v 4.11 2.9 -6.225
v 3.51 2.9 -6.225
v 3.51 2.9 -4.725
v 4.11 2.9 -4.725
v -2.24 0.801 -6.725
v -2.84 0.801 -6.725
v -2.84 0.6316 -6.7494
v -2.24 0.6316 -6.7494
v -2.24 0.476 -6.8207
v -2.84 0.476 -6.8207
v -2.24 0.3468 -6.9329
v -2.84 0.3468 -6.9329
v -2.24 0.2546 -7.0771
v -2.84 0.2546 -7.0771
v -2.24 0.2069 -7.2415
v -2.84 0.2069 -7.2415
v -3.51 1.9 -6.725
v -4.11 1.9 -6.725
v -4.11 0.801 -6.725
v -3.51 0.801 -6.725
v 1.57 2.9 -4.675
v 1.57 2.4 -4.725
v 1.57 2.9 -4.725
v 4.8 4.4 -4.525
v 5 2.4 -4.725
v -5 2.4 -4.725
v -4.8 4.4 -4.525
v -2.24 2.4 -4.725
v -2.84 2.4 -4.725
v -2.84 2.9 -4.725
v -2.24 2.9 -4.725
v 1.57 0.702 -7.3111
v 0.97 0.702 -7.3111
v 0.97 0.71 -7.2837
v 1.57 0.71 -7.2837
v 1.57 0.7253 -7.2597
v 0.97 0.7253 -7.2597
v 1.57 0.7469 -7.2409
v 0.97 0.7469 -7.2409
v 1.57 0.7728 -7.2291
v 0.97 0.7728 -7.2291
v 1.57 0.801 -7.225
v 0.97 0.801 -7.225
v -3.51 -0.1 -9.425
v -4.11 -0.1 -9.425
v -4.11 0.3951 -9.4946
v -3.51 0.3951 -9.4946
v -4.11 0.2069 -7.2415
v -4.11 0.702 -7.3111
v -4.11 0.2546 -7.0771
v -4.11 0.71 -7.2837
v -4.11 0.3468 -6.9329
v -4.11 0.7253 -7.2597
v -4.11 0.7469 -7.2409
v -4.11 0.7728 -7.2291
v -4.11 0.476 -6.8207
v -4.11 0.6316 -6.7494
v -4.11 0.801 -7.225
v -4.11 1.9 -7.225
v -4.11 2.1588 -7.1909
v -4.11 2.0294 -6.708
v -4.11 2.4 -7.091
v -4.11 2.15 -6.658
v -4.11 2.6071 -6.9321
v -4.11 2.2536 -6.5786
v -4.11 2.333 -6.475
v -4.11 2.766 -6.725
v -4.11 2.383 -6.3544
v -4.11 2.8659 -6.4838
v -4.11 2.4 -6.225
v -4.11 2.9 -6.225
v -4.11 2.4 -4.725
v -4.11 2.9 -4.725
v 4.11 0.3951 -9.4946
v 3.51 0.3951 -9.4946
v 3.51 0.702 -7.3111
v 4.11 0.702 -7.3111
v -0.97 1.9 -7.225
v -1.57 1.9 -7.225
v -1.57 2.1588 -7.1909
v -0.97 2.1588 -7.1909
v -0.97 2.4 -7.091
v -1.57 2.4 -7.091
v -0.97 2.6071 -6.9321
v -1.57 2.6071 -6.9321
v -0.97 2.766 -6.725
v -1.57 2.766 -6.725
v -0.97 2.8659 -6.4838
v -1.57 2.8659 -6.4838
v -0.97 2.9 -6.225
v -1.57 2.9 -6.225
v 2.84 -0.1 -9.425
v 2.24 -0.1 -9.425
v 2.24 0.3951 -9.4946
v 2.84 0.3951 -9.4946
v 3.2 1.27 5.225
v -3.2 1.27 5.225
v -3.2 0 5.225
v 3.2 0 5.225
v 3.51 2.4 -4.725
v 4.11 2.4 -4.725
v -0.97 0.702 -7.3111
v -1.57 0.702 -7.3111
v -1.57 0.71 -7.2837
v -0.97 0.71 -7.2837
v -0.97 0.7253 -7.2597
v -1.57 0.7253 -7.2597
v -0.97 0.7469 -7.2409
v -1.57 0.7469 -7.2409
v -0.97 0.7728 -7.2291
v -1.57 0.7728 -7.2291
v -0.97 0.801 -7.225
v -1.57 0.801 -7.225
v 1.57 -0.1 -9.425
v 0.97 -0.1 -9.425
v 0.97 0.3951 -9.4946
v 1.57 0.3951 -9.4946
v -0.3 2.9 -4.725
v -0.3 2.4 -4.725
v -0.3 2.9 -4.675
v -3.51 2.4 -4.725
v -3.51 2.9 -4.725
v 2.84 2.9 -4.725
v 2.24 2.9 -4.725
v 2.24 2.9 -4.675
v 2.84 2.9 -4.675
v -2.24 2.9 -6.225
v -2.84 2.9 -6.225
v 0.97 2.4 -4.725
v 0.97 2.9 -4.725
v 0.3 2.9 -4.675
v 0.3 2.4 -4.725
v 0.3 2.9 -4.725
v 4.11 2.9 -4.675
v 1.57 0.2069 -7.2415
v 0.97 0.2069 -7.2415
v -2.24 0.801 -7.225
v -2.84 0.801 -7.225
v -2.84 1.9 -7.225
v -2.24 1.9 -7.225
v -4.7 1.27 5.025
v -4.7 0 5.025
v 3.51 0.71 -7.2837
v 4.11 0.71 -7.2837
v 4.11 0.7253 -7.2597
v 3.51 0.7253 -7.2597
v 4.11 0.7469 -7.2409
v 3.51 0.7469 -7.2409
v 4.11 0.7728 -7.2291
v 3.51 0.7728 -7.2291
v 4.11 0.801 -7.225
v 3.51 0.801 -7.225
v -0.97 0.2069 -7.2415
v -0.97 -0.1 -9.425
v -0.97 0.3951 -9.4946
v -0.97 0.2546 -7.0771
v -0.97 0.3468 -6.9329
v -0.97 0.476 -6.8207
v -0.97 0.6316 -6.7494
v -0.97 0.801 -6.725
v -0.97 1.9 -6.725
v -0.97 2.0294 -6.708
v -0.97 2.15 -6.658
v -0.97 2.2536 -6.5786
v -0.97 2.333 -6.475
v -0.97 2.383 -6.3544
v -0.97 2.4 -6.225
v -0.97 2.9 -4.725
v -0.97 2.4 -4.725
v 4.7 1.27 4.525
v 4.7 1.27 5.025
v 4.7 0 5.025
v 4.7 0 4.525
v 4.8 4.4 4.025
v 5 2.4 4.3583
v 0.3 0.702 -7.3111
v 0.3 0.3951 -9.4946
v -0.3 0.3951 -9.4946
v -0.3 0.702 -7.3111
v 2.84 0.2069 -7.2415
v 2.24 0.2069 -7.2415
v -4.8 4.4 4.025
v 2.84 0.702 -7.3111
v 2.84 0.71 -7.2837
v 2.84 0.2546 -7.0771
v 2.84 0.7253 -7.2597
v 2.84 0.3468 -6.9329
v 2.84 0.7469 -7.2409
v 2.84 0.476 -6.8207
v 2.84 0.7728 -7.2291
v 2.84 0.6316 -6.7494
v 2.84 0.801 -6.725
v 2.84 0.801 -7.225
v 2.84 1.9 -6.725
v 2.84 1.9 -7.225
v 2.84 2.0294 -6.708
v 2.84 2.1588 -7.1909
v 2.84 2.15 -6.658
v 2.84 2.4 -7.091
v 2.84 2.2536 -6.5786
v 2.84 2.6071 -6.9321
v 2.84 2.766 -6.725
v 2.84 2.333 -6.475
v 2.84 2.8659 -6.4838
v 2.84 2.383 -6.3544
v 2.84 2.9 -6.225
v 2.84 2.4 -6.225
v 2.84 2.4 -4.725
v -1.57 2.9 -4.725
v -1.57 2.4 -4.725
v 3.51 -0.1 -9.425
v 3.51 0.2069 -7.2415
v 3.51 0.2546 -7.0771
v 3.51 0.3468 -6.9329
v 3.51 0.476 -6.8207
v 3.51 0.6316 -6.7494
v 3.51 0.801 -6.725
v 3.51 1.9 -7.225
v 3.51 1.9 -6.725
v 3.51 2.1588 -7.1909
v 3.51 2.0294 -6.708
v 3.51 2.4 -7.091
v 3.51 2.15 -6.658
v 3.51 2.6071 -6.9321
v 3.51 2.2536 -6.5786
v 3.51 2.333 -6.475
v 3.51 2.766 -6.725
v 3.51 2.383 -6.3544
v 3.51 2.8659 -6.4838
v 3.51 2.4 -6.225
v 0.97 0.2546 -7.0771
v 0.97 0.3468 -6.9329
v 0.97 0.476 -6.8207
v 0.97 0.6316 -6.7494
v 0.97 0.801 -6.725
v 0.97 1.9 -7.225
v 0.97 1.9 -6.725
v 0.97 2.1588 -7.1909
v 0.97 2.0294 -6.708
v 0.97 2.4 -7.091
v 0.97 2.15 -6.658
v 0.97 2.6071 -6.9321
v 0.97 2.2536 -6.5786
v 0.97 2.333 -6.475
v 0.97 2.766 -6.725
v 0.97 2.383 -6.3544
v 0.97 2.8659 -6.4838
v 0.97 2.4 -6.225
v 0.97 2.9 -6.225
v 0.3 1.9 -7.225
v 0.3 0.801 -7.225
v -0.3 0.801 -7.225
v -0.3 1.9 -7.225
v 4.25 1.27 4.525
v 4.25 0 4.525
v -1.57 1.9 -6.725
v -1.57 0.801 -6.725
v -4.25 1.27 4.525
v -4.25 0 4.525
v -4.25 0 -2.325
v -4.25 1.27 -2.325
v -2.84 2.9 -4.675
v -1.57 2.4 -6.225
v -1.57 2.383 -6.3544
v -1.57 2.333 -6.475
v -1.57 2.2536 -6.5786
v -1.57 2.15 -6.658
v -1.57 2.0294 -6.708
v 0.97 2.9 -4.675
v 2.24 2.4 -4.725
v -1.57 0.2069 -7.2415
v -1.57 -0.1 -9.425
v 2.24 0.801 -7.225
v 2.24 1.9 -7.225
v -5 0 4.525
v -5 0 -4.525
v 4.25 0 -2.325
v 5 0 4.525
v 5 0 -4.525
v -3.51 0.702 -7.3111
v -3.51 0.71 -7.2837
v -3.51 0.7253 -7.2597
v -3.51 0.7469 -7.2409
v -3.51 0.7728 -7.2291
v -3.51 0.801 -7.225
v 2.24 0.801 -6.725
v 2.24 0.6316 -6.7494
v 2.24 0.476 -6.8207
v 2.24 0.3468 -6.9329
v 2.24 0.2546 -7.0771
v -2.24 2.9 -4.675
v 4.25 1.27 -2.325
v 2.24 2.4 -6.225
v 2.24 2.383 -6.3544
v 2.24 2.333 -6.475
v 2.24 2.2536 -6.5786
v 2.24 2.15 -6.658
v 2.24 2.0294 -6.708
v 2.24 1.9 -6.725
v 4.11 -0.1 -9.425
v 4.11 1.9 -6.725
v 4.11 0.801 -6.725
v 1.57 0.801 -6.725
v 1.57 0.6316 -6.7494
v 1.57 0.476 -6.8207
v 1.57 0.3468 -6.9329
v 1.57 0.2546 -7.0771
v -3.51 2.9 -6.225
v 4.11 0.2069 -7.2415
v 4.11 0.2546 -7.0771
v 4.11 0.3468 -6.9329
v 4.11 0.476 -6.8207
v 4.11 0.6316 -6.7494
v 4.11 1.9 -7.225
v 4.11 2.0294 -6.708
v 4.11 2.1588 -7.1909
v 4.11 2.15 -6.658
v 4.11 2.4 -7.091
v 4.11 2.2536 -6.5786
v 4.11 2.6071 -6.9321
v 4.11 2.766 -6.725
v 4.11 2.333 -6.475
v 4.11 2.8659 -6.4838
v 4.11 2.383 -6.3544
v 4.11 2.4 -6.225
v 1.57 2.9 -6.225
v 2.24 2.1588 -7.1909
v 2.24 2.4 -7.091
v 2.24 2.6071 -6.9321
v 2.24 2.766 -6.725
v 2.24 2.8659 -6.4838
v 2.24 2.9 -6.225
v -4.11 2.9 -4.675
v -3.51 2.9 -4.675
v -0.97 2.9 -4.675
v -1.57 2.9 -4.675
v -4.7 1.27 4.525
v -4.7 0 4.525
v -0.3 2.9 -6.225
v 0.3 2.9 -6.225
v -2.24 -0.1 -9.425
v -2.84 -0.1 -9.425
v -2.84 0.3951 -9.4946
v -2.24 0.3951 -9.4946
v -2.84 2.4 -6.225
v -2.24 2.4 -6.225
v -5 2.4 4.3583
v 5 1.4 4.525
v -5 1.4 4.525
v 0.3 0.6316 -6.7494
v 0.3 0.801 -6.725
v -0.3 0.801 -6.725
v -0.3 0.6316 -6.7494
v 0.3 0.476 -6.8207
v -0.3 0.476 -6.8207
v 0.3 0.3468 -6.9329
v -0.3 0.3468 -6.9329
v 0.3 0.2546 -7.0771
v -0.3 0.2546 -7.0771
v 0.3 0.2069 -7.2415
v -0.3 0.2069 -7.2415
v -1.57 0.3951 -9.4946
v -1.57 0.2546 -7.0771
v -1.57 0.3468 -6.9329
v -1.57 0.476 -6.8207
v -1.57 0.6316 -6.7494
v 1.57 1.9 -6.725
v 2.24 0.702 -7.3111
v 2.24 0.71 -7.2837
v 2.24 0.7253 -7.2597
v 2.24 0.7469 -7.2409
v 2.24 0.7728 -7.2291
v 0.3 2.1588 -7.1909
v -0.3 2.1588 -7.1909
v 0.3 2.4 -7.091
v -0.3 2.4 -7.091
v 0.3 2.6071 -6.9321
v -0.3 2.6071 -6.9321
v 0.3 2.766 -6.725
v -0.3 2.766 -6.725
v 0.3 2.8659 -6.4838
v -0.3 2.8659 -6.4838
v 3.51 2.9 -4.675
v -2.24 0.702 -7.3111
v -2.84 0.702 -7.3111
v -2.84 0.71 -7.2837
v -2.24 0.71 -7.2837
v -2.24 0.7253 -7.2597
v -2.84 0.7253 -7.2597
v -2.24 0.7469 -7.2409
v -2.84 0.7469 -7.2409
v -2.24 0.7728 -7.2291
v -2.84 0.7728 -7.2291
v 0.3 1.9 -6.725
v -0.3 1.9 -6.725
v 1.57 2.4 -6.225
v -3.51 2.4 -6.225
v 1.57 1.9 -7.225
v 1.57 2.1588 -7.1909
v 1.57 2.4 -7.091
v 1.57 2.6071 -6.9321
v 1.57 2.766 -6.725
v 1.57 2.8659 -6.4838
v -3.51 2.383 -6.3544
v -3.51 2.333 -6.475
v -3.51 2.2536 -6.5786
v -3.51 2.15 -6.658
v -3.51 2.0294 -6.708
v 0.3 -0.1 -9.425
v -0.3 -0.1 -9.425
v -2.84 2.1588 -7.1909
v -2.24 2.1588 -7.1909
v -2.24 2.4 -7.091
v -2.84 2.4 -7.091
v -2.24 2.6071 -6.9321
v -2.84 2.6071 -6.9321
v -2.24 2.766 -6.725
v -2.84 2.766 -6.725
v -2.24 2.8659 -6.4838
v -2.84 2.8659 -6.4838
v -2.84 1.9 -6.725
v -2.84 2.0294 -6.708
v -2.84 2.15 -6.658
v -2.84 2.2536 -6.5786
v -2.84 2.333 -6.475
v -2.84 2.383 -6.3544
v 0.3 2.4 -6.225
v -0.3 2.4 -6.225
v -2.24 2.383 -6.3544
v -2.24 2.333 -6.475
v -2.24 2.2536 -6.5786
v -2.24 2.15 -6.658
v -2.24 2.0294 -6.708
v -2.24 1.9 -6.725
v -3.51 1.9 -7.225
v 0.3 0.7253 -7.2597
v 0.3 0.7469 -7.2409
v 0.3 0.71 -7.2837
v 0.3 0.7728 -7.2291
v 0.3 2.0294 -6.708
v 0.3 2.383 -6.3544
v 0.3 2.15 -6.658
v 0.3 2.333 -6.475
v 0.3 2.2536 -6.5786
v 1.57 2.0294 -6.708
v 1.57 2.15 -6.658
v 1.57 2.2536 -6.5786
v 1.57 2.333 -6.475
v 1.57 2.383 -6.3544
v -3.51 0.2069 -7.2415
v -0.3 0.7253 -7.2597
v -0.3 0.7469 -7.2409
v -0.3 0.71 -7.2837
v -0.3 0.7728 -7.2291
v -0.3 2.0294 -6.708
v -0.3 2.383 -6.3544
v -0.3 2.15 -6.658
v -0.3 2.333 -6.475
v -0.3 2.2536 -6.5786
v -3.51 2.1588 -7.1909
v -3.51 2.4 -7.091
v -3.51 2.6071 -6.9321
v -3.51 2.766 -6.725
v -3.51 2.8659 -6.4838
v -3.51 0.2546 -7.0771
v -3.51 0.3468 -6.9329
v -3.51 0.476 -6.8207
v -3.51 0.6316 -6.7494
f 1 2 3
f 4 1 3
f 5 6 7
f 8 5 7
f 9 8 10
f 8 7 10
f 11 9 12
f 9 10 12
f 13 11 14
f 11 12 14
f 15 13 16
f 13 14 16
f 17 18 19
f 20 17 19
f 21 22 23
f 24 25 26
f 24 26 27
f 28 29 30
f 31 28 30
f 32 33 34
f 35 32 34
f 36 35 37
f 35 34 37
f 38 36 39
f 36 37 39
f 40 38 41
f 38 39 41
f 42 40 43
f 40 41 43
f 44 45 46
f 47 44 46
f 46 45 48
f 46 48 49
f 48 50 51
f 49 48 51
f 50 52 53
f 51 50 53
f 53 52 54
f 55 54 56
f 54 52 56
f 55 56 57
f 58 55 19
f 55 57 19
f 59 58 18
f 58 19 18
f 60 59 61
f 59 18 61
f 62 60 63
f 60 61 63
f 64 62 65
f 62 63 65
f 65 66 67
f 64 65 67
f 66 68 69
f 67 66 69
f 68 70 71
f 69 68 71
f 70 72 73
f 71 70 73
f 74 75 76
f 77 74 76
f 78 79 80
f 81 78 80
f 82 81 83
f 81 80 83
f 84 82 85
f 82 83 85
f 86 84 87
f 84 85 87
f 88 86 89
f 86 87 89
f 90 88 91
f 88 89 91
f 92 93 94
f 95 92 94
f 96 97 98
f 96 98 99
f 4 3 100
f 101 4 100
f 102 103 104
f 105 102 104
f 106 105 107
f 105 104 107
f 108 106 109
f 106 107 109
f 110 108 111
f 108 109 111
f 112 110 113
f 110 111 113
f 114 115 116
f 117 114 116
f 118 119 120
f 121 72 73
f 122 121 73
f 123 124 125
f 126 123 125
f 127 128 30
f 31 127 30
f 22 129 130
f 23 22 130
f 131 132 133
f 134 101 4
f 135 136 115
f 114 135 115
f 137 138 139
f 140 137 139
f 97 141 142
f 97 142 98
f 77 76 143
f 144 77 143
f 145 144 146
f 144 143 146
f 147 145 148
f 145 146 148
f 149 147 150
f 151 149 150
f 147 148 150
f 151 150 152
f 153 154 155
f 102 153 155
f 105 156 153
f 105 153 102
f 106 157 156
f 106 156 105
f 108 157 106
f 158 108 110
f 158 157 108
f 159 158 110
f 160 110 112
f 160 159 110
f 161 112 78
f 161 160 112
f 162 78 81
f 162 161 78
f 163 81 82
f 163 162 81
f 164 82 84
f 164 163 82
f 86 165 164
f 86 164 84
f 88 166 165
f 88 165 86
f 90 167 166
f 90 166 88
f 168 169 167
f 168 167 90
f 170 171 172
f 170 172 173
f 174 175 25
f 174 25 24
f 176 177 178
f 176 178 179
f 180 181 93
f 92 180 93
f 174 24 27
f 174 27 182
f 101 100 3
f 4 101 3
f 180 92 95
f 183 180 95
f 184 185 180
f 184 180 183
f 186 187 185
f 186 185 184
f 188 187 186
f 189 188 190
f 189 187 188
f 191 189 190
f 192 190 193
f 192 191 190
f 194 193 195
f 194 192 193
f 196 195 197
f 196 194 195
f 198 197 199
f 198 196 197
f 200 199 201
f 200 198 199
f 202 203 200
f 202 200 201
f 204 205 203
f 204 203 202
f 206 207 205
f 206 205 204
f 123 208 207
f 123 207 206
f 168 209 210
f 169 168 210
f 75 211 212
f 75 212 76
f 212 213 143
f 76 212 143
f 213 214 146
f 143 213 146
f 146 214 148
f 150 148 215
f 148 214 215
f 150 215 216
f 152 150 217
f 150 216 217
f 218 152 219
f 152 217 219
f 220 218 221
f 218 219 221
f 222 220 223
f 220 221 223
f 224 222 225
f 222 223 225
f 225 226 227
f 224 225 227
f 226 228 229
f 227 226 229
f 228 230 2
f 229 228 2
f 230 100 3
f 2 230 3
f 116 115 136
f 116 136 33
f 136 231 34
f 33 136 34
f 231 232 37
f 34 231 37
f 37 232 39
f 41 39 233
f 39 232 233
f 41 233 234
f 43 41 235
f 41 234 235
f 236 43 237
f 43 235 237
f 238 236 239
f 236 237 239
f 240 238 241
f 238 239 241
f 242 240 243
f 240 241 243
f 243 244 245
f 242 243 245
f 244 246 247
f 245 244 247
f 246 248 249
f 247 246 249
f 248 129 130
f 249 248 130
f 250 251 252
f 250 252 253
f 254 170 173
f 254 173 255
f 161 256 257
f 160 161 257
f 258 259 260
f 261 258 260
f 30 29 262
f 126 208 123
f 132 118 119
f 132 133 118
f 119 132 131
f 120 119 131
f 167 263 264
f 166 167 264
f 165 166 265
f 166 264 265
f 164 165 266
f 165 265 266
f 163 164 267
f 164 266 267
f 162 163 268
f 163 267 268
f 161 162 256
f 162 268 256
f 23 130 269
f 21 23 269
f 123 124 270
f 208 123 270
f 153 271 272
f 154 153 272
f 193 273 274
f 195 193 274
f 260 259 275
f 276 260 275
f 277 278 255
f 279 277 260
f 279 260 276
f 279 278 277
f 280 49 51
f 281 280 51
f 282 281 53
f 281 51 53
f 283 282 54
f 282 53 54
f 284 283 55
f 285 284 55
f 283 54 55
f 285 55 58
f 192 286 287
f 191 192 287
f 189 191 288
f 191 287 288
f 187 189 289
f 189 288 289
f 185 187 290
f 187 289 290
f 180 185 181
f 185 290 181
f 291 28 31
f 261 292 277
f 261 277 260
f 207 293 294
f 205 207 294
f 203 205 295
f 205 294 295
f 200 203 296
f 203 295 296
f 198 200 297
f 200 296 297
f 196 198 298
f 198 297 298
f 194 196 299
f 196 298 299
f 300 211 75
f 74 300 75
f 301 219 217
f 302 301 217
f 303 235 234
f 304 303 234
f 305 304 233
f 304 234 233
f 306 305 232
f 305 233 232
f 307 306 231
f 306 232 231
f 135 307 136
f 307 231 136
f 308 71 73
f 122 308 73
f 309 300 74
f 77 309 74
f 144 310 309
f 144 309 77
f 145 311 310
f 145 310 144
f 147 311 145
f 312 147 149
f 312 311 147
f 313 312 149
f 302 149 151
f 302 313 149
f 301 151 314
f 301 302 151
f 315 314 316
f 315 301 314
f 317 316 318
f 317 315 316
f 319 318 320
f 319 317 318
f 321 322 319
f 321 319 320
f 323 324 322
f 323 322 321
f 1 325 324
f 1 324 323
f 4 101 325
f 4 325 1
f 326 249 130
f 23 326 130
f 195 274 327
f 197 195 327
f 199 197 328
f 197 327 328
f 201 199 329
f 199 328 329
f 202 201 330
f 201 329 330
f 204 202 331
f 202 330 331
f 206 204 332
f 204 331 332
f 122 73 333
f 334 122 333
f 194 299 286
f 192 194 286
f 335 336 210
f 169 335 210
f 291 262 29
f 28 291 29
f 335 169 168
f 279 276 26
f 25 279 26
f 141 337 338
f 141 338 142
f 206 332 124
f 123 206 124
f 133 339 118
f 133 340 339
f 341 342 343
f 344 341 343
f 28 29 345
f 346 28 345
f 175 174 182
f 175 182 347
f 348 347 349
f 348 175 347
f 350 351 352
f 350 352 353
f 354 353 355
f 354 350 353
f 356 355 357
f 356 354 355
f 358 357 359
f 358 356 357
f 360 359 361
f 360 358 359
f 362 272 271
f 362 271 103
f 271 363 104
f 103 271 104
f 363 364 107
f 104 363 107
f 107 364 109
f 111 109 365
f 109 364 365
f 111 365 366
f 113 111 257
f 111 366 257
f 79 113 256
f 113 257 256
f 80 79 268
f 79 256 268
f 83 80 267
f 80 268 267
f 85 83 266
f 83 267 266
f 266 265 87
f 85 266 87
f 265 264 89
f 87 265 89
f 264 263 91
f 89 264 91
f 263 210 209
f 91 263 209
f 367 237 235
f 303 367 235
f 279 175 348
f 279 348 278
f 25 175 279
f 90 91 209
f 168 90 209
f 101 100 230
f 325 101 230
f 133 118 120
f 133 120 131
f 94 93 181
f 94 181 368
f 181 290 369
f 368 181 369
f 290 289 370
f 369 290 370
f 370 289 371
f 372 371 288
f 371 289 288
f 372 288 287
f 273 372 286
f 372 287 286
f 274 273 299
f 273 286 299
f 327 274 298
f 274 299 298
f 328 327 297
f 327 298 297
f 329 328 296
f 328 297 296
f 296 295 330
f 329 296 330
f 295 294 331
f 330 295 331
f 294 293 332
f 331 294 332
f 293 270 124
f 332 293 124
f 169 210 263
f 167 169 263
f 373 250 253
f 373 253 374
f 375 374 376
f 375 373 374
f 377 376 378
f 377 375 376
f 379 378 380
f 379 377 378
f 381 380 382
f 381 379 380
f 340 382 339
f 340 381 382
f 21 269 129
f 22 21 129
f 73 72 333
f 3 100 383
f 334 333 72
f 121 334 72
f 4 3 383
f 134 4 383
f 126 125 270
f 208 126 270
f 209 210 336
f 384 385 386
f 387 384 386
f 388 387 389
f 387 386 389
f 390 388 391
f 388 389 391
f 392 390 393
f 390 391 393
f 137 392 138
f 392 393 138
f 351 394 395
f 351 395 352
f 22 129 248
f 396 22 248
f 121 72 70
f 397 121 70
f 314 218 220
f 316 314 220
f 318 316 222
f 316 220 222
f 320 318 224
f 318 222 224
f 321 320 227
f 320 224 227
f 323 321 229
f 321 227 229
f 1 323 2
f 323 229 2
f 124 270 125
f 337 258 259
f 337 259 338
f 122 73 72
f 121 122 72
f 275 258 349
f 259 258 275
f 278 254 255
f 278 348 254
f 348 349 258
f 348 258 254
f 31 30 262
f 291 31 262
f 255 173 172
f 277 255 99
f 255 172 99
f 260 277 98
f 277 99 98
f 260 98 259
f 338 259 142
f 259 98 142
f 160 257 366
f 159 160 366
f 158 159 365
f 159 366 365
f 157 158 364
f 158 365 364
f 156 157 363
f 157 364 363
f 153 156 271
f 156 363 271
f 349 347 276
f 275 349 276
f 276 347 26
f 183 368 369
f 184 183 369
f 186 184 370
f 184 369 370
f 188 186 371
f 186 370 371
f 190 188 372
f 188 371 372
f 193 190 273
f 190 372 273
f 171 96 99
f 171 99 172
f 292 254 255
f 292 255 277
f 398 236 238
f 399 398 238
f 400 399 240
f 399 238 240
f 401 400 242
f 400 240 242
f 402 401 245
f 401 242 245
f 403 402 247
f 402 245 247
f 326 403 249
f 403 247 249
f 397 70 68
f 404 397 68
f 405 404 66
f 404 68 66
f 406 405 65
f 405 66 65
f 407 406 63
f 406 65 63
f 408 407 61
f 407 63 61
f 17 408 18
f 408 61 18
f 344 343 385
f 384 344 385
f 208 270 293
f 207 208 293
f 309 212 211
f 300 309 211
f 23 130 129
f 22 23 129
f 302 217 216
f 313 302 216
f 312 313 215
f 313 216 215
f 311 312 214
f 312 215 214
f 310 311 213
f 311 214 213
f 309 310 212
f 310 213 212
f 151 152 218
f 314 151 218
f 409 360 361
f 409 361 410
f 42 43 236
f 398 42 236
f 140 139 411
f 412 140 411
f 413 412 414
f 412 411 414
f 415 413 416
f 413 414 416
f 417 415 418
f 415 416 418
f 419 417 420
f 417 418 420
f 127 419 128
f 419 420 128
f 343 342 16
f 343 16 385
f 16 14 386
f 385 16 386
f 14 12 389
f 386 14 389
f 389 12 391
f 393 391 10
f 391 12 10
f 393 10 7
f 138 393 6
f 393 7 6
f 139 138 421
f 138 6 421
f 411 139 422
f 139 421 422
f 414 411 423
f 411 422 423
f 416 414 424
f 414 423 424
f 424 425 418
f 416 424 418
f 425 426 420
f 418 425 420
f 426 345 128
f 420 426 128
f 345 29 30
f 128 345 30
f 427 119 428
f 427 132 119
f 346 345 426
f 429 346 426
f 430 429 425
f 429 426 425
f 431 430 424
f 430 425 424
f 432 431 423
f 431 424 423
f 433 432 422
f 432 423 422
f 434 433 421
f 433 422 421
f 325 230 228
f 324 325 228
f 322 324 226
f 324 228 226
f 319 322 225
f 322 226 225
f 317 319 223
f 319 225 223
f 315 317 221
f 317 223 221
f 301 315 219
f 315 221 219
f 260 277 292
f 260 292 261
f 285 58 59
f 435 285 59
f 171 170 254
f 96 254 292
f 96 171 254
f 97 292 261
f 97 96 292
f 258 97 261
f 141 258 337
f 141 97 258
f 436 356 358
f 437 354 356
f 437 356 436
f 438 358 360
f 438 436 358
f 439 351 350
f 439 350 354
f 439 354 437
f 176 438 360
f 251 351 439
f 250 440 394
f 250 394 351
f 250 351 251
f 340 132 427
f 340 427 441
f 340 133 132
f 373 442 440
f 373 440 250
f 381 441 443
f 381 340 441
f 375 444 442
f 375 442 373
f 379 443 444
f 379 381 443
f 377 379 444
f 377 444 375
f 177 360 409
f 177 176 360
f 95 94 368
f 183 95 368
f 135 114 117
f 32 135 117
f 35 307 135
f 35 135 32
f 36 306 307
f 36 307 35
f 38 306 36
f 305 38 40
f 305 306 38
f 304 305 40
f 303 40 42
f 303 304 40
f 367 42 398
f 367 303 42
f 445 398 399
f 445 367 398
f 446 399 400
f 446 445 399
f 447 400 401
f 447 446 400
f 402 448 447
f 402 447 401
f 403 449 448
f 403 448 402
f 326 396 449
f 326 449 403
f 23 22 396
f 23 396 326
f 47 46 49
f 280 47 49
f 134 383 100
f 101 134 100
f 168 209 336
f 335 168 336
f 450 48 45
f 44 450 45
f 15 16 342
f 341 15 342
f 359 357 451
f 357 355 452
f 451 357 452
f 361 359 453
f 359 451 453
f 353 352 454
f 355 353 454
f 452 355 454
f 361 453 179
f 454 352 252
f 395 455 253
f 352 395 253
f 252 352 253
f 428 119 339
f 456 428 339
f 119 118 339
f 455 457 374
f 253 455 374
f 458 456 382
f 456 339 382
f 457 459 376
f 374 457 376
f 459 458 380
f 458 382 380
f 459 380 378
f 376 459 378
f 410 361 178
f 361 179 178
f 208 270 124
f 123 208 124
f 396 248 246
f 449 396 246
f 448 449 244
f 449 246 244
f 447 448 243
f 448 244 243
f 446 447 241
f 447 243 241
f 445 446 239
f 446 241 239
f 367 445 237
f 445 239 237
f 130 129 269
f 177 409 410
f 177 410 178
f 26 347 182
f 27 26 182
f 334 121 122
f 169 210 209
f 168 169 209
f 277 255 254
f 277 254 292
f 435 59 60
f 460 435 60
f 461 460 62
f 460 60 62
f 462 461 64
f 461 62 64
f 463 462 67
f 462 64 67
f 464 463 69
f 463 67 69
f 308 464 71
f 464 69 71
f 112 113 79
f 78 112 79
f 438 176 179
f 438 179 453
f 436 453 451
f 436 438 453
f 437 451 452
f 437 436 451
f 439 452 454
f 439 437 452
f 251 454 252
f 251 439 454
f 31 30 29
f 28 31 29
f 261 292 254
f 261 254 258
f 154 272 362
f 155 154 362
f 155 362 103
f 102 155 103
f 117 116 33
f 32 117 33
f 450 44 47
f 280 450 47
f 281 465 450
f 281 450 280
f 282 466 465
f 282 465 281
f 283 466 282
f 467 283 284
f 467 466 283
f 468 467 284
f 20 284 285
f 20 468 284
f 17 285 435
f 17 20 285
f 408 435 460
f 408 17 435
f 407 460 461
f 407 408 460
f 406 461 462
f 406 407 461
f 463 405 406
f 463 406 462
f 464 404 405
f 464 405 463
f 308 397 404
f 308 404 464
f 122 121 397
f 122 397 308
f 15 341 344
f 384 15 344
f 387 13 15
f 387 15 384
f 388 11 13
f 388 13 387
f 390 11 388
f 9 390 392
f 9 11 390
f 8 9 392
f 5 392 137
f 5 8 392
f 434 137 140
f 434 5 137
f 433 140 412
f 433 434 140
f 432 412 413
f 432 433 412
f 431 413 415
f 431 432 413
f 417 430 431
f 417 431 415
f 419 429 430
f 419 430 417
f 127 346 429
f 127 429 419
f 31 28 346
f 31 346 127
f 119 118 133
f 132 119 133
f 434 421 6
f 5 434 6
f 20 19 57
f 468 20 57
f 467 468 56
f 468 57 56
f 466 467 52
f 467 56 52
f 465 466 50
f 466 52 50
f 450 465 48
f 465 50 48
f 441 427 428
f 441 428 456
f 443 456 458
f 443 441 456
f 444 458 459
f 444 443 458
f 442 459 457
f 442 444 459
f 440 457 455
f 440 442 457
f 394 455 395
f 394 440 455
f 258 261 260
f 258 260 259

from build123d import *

# Parameters (mm, degrees)
MAIN_BODY_DEPTH               = 5
ICP_CUT_W                     = 8.5
ICP_CUT_H                     = 6.85
BACK_IC_PLATE_CUT_DEPTH       = 1.27
BACK_IC_PLATE_DEPTH           = 1.27
IC_LEG_DEPTH                  = 0.3
IC_LEG_JOINT_COMPLETION_REACH = 13.973
LC_W                          = 0.6
LC_H                          = 0.5
SIDE_CHAMFER_DEPTH            = 12.597722784
LP_START                      = 3.51
LP_IC_LEGS_DEPTH              = 0.6
LP_START_2                    = 2.24
LP_IC_LEGS_2_DEPTH            = 0.6
LP_START_3                    = 0.97
LP_IC_LEGS_3_DEPTH            = 0.6
LP_START_4                    = -4.11
LP_IC_LEGS_4_DEPTH            = 0.6
LP_START_5                    = -2.84
LP_IC_LEGS_5_DEPTH            = 0.6
LP_START_6                    = -1.57
LP_IC_LEGS_6_DEPTH            = 0.6
LP_IC_LEGS_7_DEPTH            = 0.6
LP_IC_LEGS_8_DEPTH            = 0.6
LP_IC_LEGS_9_DEPTH            = 0.6
LP_IC_LEGS_10_DEPTH           = 0.6
LP_IC_LEGS_11_DEPTH           = 0.6
LP_IC_LEGS_12_DEPTH           = 0.6


# Read off the part's stored shape, not the designer's step: LP IC LEGS
with BuildPart() as part:
    # MB → MAIN BODY (new, symmetric)
    with BuildSketch(Plane(origin=(0, 0, 0), x_dir=(0, 0, -1), z_dir=(1, 0, 0))):
        Polygon((4.525, 4.4), (-4.025, 4.4), (-4.525, 1.4), (-4.525, 0), (4.525, 0), (4.725, 2.4), align=None)
    extrude(amount=MAIN_BODY_DEPTH, both=True)

    # ICP CUT → BACK IC PLATE CUT (cut)
    with BuildSketch(Plane(origin=(0, 0, 0), x_dir=(-1, 0, 0), z_dir=(0, -1, 0))):
        with Locations((0, -1.1)):
            Rectangle(ICP_CUT_W, ICP_CUT_H)
    extrude(amount=-BACK_IC_PLATE_CUT_DEPTH, mode=Mode.SUBTRACT)


with BuildPart() as body_2:
    # ICP → BACK IC PLATE (new body)
    with BuildSketch(Plane.XZ.offset(-1.27)):
        Polygon((-4.25, 4.525), (-4.7, 4.525), (-4.7, 5.025), (-3.2, 5.225), (3.2, 5.225), (4.7, 5.025), (4.7, 4.525), (4.25, 4.525), (4.25, -2.325), (-4.25, -2.325), align=None)
    extrude(amount=BACK_IC_PLATE_DEPTH)


with BuildPart() as body_3:
    # Sketch3 → IC LEG (new, symmetric)
    with BuildSketch(Plane(origin=(0, 0, 0), x_dir=(0, 0, -1), z_dir=(1, 0, 0))):
        with BuildLine():
            Line((4.725, 2.4), (6.225, 2.4))
            ThreePointArc((6.225, 2.4), (6.578553391, 2.253553391), (6.725, 1.9))
            Line((6.725, 1.9), (6.725, 0.801032296))
            ThreePointArc((6.725, 0.801032296), (6.872174252, 0.407396879), (7.241496139, 0.206871455))
            Line((7.241496139, 0.206871455), (9.425, -0.1))
            Line((9.425, -0.1), (9.49458655, 0.395134034))
            Line((9.49458655, 0.395134034), (7.31108269, 0.70200549))
            ThreePointArc((7.31108269, 0.70200549), (7.249529042, 0.735426393), (7.225, 0.801032296))
            Line((7.225, 0.801032296), (7.225, 1.9))
            ThreePointArc((7.225, 1.9), (6.932106781, 2.607106781), (6.225, 2.9))
            Line((6.225, 2.9), (4.725, 2.9))
            Line((4.725, 2.9), (4.725, 2.4))
        make_face()
    extrude(amount=IC_LEG_DEPTH, both=True)


with BuildPart() as body_4:

    # LC → IC LEG JOINT COMPLETION (new, up to next)
    with BuildSketch(Plane.XY.offset(-4.725), mode=Mode.PRIVATE) as ic_leg_joint_completion_sk1:
        with Locations((0, 2.65)):
            Rectangle(LC_W, LC_H)
    ic_leg_joint_completion_tool1 = extrude(ic_leg_joint_completion_sk1.sketch, amount=IC_LEG_JOINT_COMPLETION_REACH, mode=Mode.PRIVATE) - part.part
    add(ic_leg_joint_completion_tool1.solids().sort_by_distance((0, 2.65, -4.725))[0])


with BuildPart() as part_1:
    add(part.part)

    # CHAMFER CUTS → SIDE CHAMFER (cut, symmetric)
    with BuildSketch(Plane.XY):
        Polygon((4.8, 4.4), (5, 4.4), (5, 2.4), align=None)
    side_chamfer = extrude(amount=SIDE_CHAMFER_DEPTH, both=True, mode=Mode.SUBTRACT)

    # SC M: SIDE CHAMFER across plane
    add(side_chamfer.mirror(Plane(origin=(0, 0, 0), x_dir=(0, 0, 1), z_dir=(1, 0, 0))), mode=Mode.SUBTRACT)


with BuildPart() as body_5:
    # LP IC LEGS outline → LP IC LEGS (new body)
    with BuildSketch(Plane.YZ.offset(LP_START)):
        Polygon((2.9, -4.725), (2.9, -4.675), (2.4, -4.725), align=None)
    extrude(amount=LP_IC_LEGS_DEPTH)


with BuildPart() as body_6:
    # LP IC LEGS 2 outline → LP IC LEGS 2 (new body)
    with BuildSketch(Plane.YZ.offset(LP_START_2)):
        Polygon((2.9, -4.725), (2.9, -4.675), (2.4, -4.725), align=None)
    extrude(amount=LP_IC_LEGS_2_DEPTH)


with BuildPart() as body_7:
    # LP IC LEGS 3 outline → LP IC LEGS 3 (new body)
    with BuildSketch(Plane.YZ.offset(LP_START_3)):
        Polygon((2.9, -4.725), (2.9, -4.675), (2.4, -4.725), align=None)
    extrude(amount=LP_IC_LEGS_3_DEPTH)


with BuildPart() as body_8:
    # LP IC LEGS 4 outline → LP IC LEGS 4 (new body)
    with BuildSketch(Plane.YZ.offset(LP_START_4)):
        Polygon((2.9, -4.725), (2.9, -4.675), (2.4, -4.725), align=None)
    extrude(amount=LP_IC_LEGS_4_DEPTH)


with BuildPart() as body_9:
    # LP IC LEGS 5 outline → LP IC LEGS 5 (new body)
    with BuildSketch(Plane.YZ.offset(LP_START_5)):
        Polygon((2.9, -4.725), (2.9, -4.675), (2.4, -4.725), align=None)
    extrude(amount=LP_IC_LEGS_5_DEPTH)


with BuildPart() as body_10:
    # LP IC LEGS 6 outline → LP IC LEGS 6 (new body)
    with BuildSketch(Plane.YZ.offset(LP_START_6)):
        Polygon((2.9, -4.725), (2.9, -4.675), (2.4, -4.725), align=None)
    extrude(amount=LP_IC_LEGS_6_DEPTH)


with BuildPart() as body_11:
    # LP IC LEGS 7 outline → LP IC LEGS 7 (new body)
    with BuildSketch(Plane.YZ.offset(LP_START)):
        with BuildLine():
            Line((0.206871455, -7.241496139), (-0.1, -9.425))
            Line((-0.1, -9.425), (0.395134034, -9.49458655))
            Line((0.395134034, -9.49458655), (0.70200549, -7.31108269))
            ThreePointArc((0.70200549, -7.31108269), (0.735426393, -7.249529042), (0.801032296, -7.225))
            Line((0.801032296, -7.225), (1.9, -7.225))
            ThreePointArc((1.9, -7.225), (2.607106781, -6.932106781), (2.9, -6.225))
            Line((2.9, -6.225), (2.9, -4.725))
            Line((2.9, -4.725), (2.4, -4.725))
            Line((2.4, -4.725), (2.4, -6.225))
            ThreePointArc((2.4, -6.225), (2.253553391, -6.578553391), (1.9, -6.725))
            Line((1.9, -6.725), (0.801032296, -6.725))
            ThreePointArc((0.801032296, -6.725), (0.407396879, -6.872174252), (0.206871455, -7.241496139))
        make_face()
    extrude(amount=LP_IC_LEGS_7_DEPTH)


with BuildPart() as body_12:
    # LP IC LEGS 8 outline → LP IC LEGS 8 (new body)
    with BuildSketch(Plane.YZ.offset(LP_START_2)):
        with BuildLine():
            Line((0.206871455, -7.241496139), (-0.1, -9.425))
            Line((-0.1, -9.425), (0.395134034, -9.49458655))
            Line((0.395134034, -9.49458655), (0.70200549, -7.31108269))
            ThreePointArc((0.70200549, -7.31108269), (0.735426393, -7.249529042), (0.801032296, -7.225))
            Line((0.801032296, -7.225), (1.9, -7.225))
            ThreePointArc((1.9, -7.225), (2.607106781, -6.932106781), (2.9, -6.225))
            Line((2.9, -6.225), (2.9, -4.725))
            Line((2.9, -4.725), (2.4, -4.725))
            Line((2.4, -4.725), (2.4, -6.225))
            ThreePointArc((2.4, -6.225), (2.253553391, -6.578553391), (1.9, -6.725))
            Line((1.9, -6.725), (0.801032296, -6.725))
            ThreePointArc((0.801032296, -6.725), (0.407396879, -6.872174252), (0.206871455, -7.241496139))
        make_face()
    extrude(amount=LP_IC_LEGS_8_DEPTH)


with BuildPart() as body_13:
    # LP IC LEGS 9 outline → LP IC LEGS 9 (new body)
    with BuildSketch(Plane.YZ.offset(LP_START_3)):
        with BuildLine():
            Line((0.206871455, -7.241496139), (-0.1, -9.425))
            Line((-0.1, -9.425), (0.395134034, -9.49458655))
            Line((0.395134034, -9.49458655), (0.70200549, -7.31108269))
            ThreePointArc((0.70200549, -7.31108269), (0.735426393, -7.249529042), (0.801032296, -7.225))
            Line((0.801032296, -7.225), (1.9, -7.225))
            ThreePointArc((1.9, -7.225), (2.607106781, -6.932106781), (2.9, -6.225))
            Line((2.9, -6.225), (2.9, -4.725))
            Line((2.9, -4.725), (2.4, -4.725))
            Line((2.4, -4.725), (2.4, -6.225))
            ThreePointArc((2.4, -6.225), (2.253553391, -6.578553391), (1.9, -6.725))
            Line((1.9, -6.725), (0.801032296, -6.725))
            ThreePointArc((0.801032296, -6.725), (0.407396879, -6.872174252), (0.206871455, -7.241496139))
        make_face()
    extrude(amount=LP_IC_LEGS_9_DEPTH)


with BuildPart() as body_14:
    # LP IC LEGS 10 outline → LP IC LEGS 10 (new body)
    with BuildSketch(Plane.YZ.offset(LP_START_4)):
        with BuildLine():
            Line((0.206871455, -7.241496139), (-0.1, -9.425))
            Line((-0.1, -9.425), (0.395134034, -9.49458655))
            Line((0.395134034, -9.49458655), (0.70200549, -7.31108269))
            ThreePointArc((0.70200549, -7.31108269), (0.735426393, -7.249529042), (0.801032296, -7.225))
            Line((0.801032296, -7.225), (1.9, -7.225))
            ThreePointArc((1.9, -7.225), (2.607106781, -6.932106781), (2.9, -6.225))
            Line((2.9, -6.225), (2.9, -4.725))
            Line((2.9, -4.725), (2.4, -4.725))
            Line((2.4, -4.725), (2.4, -6.225))
            ThreePointArc((2.4, -6.225), (2.253553391, -6.578553391), (1.9, -6.725))
            Line((1.9, -6.725), (0.801032296, -6.725))
            ThreePointArc((0.801032296, -6.725), (0.407396879, -6.872174252), (0.206871455, -7.241496139))
        make_face()
    extrude(amount=LP_IC_LEGS_10_DEPTH)


with BuildPart() as body_15:
    # LP IC LEGS 11 outline → LP IC LEGS 11 (new body)
    with BuildSketch(Plane.YZ.offset(LP_START_5)):
        with BuildLine():
            Line((0.206871455, -7.241496139), (-0.1, -9.425))
            Line((-0.1, -9.425), (0.395134034, -9.49458655))
            Line((0.395134034, -9.49458655), (0.70200549, -7.31108269))
            ThreePointArc((0.70200549, -7.31108269), (0.735426393, -7.249529042), (0.801032296, -7.225))
            Line((0.801032296, -7.225), (1.9, -7.225))
            ThreePointArc((1.9, -7.225), (2.607106781, -6.932106781), (2.9, -6.225))
            Line((2.9, -6.225), (2.9, -4.725))
            Line((2.9, -4.725), (2.4, -4.725))
            Line((2.4, -4.725), (2.4, -6.225))
            ThreePointArc((2.4, -6.225), (2.253553391, -6.578553391), (1.9, -6.725))
            Line((1.9, -6.725), (0.801032296, -6.725))
            ThreePointArc((0.801032296, -6.725), (0.407396879, -6.872174252), (0.206871455, -7.241496139))
        make_face()
    extrude(amount=LP_IC_LEGS_11_DEPTH)


with BuildPart() as body_16:
    # LP IC LEGS 12 outline → LP IC LEGS 12 (new body)
    with BuildSketch(Plane.YZ.offset(LP_START_6)):
        with BuildLine():
            Line((0.206871455, -7.241496139), (-0.1, -9.425))
            Line((-0.1, -9.425), (0.395134034, -9.49458655))
            Line((0.395134034, -9.49458655), (0.70200549, -7.31108269))
            ThreePointArc((0.70200549, -7.31108269), (0.735426393, -7.249529042), (0.801032296, -7.225))
            Line((0.801032296, -7.225), (1.9, -7.225))
            ThreePointArc((1.9, -7.225), (2.607106781, -6.932106781), (2.9, -6.225))
            Line((2.9, -6.225), (2.9, -4.725))
            Line((2.9, -4.725), (2.4, -4.725))
            Line((2.4, -4.725), (2.4, -6.225))
            ThreePointArc((2.4, -6.225), (2.253553391, -6.578553391), (1.9, -6.725))
            Line((1.9, -6.725), (0.801032296, -6.725))
            ThreePointArc((0.801032296, -6.725), (0.407396879, -6.872174252), (0.206871455, -7.241496139))
        make_face()
    extrude(amount=LP_IC_LEGS_12_DEPTH)


solid = Compound([body_2.part, body_3.part, body_4.part, part_1.part, body_5.part, body_6.part, body_7.part, body_8.part, body_9.part, body_10.part, body_11.part, body_12.part, body_13.part, body_14.part, body_15.part, body_16.part])
